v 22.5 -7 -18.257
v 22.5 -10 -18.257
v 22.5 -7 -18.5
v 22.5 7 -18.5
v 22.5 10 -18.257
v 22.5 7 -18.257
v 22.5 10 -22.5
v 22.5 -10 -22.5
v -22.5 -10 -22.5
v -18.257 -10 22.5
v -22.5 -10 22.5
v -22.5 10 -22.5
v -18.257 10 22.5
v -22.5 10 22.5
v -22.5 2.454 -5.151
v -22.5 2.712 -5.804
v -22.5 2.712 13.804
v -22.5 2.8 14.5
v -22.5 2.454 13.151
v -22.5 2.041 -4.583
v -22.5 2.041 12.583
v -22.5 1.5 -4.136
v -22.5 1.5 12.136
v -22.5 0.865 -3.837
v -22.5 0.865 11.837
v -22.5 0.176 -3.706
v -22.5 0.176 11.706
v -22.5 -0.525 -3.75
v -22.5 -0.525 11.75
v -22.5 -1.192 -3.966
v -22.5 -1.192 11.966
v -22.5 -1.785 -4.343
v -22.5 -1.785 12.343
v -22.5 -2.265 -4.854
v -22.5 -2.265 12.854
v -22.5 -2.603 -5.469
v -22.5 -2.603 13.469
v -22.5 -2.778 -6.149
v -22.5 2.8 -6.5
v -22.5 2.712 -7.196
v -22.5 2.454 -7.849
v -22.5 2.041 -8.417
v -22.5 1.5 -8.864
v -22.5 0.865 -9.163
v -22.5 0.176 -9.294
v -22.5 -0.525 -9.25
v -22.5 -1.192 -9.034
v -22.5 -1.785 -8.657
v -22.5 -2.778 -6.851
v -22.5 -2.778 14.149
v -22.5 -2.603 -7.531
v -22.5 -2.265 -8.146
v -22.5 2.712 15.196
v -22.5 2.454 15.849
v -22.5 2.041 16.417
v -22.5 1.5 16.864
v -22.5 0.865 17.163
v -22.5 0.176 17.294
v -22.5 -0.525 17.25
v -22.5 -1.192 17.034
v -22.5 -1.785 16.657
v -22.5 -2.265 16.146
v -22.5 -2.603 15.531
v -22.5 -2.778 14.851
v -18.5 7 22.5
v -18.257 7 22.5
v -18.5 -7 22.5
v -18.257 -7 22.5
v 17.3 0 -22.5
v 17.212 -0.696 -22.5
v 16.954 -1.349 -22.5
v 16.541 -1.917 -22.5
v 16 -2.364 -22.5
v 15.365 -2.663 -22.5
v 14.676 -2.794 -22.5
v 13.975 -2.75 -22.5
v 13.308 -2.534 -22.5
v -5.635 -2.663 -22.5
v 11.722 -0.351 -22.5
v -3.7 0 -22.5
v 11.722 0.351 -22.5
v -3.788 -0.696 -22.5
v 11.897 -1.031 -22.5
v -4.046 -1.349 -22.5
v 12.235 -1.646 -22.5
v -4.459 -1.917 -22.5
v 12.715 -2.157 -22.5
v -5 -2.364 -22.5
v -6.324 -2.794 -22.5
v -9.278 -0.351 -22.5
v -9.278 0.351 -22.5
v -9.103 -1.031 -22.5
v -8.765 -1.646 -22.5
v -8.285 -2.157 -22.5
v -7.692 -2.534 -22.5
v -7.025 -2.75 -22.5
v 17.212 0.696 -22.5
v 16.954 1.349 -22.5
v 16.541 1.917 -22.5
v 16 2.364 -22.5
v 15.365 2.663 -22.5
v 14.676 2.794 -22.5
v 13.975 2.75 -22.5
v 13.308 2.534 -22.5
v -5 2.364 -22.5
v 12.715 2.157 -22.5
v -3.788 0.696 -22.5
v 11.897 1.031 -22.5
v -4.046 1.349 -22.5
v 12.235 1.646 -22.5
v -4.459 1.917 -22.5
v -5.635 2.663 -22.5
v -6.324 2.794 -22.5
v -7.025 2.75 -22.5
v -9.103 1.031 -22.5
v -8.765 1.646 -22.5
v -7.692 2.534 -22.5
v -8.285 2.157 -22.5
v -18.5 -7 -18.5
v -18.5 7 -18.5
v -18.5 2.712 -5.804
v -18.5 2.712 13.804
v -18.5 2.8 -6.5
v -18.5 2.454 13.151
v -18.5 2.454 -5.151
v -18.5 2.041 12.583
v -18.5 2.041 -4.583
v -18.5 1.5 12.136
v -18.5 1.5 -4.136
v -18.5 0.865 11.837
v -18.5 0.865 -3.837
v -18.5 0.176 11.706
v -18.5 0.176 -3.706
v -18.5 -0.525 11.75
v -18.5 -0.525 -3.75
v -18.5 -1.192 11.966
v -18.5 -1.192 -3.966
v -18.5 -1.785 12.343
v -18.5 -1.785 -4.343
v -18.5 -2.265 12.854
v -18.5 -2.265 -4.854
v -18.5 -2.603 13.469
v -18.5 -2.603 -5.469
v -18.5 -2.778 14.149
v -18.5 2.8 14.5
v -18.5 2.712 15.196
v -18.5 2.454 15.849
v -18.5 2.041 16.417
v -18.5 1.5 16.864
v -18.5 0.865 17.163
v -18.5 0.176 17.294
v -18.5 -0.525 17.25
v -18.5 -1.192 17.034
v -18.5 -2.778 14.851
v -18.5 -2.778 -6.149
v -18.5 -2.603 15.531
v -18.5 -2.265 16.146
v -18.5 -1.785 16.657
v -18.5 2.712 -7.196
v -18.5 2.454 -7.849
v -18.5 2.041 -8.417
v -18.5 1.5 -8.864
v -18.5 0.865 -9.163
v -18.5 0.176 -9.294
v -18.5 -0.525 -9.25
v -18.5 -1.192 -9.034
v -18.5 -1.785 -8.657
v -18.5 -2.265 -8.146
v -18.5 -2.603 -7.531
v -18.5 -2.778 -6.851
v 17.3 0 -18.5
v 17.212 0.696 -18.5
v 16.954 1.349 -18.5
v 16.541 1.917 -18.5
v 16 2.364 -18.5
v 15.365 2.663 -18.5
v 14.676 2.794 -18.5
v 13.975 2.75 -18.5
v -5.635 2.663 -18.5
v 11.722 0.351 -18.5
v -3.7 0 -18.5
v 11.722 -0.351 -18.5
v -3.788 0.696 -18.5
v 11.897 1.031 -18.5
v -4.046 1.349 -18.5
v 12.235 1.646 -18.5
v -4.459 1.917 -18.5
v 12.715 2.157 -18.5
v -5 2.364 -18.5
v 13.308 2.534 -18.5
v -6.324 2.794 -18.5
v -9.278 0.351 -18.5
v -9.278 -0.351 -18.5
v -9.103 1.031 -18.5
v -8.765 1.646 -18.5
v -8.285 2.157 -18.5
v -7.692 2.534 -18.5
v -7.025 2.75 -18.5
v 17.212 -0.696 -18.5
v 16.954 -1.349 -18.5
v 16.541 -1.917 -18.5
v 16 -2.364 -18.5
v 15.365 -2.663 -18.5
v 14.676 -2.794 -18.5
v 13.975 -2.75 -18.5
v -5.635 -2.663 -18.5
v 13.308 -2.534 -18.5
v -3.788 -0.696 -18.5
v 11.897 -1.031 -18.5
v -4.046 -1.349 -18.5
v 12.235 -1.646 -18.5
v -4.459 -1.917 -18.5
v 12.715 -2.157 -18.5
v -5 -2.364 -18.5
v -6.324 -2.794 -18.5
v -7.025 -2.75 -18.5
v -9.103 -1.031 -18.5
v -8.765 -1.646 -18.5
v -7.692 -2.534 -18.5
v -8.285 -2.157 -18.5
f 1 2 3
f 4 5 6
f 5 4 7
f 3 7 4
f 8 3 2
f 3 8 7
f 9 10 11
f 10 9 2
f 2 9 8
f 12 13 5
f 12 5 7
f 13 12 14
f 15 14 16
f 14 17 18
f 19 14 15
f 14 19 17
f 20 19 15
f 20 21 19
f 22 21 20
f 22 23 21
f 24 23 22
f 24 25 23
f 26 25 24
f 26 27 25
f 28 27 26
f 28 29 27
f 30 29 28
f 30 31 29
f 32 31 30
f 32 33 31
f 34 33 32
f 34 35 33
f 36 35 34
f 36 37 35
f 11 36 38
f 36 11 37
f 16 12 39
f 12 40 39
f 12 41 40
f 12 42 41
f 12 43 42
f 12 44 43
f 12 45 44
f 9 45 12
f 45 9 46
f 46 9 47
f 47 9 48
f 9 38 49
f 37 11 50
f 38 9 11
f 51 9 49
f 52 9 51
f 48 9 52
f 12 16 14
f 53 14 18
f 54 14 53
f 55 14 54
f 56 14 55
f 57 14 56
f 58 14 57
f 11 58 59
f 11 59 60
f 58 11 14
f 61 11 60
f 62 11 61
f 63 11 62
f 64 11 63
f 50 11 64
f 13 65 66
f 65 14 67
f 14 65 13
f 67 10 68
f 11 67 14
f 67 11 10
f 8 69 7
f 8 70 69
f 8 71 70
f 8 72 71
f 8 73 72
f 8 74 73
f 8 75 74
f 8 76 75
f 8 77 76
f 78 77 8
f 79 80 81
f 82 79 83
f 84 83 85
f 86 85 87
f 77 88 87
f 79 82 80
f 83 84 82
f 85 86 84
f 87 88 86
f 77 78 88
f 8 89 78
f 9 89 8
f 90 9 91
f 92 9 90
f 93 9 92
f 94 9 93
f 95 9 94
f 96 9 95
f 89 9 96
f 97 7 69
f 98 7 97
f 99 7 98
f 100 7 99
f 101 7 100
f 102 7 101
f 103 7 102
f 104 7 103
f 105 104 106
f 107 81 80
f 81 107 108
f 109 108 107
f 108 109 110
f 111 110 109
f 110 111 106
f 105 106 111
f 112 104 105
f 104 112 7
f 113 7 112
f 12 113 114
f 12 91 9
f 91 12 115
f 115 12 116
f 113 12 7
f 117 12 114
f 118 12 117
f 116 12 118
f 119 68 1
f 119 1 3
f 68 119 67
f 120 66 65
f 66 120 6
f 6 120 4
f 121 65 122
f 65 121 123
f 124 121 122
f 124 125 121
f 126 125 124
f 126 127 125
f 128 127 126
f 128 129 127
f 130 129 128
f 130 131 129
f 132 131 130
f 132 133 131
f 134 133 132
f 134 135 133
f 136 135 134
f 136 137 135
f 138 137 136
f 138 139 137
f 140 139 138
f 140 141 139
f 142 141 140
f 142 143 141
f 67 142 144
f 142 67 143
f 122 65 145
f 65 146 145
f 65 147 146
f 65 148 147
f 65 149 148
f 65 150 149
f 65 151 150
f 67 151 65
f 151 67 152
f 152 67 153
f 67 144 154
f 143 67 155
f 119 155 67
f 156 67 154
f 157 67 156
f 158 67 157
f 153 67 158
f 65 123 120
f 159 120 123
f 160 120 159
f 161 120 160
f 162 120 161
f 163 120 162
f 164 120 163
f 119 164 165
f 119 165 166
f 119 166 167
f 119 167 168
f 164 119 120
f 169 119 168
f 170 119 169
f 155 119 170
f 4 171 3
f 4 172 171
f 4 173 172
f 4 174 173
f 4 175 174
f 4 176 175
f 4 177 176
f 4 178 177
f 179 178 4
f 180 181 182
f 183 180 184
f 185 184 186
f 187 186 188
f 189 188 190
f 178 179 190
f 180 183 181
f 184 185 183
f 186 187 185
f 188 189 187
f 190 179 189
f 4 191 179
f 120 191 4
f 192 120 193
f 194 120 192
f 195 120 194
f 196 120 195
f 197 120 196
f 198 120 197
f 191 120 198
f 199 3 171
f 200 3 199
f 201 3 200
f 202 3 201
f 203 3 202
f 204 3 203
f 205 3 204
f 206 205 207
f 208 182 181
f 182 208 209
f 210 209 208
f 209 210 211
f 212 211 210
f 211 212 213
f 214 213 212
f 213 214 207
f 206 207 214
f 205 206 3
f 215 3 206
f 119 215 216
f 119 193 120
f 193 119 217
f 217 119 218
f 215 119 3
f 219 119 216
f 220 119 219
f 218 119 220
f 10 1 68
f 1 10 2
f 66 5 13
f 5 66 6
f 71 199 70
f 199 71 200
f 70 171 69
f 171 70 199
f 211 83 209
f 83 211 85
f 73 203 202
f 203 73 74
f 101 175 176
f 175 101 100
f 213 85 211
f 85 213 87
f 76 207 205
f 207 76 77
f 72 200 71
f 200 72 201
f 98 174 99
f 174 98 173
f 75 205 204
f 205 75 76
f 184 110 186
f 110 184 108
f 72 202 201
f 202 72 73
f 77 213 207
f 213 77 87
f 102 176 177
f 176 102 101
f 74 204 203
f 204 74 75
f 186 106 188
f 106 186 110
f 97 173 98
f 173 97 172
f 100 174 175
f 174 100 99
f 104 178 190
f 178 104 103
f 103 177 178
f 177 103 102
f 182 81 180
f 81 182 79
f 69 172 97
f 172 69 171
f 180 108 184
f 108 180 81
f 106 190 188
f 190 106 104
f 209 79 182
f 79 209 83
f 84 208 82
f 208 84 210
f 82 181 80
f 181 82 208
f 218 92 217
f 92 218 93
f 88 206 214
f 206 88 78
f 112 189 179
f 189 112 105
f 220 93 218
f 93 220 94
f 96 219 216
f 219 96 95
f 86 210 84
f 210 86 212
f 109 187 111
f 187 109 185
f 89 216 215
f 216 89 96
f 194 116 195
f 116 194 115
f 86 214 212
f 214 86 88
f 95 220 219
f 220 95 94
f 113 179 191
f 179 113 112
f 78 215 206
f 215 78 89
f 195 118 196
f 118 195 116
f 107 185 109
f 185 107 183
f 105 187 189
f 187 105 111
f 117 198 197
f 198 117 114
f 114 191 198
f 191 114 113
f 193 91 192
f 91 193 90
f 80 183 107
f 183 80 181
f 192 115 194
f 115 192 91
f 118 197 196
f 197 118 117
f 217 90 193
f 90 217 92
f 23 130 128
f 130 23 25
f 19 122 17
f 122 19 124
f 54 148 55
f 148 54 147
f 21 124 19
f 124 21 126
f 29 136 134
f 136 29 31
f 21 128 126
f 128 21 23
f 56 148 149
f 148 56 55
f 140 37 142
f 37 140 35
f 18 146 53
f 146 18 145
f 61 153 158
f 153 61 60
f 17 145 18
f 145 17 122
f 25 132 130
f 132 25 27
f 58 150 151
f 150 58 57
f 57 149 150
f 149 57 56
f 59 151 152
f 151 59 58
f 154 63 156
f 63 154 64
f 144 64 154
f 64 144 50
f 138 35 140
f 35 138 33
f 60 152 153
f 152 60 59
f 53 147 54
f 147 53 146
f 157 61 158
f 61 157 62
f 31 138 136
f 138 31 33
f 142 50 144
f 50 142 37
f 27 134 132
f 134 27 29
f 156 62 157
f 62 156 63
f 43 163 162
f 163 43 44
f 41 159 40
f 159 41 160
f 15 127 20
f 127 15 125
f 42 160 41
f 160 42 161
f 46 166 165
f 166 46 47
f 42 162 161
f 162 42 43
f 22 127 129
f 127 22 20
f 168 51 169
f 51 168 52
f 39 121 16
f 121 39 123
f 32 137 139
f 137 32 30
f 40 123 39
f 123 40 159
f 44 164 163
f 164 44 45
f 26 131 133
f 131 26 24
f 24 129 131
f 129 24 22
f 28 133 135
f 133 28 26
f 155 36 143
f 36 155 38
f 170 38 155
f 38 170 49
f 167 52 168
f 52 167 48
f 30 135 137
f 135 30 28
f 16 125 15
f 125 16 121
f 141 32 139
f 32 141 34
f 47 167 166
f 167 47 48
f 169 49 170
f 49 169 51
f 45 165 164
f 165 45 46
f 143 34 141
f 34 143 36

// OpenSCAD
// 90 degree bracket

$fn = 25;
length = 45;
width = 20;
walls = 3;

rHole = 2.8;

rotate([90, 0, 0])
difference()
{
    cube([length, length, width], center=true);
    
    translate([4, 4, 0])
    cube([length, length, width-(walls * 2)], center=true);
    
    rotate([0,0,45])
    translate([length/2 + 3, 0, 0])
    cube([length, length + 20, width+2], center= true);
    
    // bottom screw holes
    translate([length/2 - 8, -length/2 + 5, 0])
    rotate([90, 0, 0])
    #cylinder(r=rHole, h=10);

    translate([-length/2 + 16, -length/2 + 5, 0])
    rotate([90, 0, 0])
    #cylinder(r=rHole, h=10);
    
    
    // side screw holes
    translate([-length/2 - 5, length/2 - 8, 0])
    rotate([0, 90, 0])
    #cylinder(r=rHole, h=10);

    translate([-length/2 - 5, -length/2 + 16, 0])
    rotate([0, 90, 0])
    #cylinder(r=rHole, h=10);
}
